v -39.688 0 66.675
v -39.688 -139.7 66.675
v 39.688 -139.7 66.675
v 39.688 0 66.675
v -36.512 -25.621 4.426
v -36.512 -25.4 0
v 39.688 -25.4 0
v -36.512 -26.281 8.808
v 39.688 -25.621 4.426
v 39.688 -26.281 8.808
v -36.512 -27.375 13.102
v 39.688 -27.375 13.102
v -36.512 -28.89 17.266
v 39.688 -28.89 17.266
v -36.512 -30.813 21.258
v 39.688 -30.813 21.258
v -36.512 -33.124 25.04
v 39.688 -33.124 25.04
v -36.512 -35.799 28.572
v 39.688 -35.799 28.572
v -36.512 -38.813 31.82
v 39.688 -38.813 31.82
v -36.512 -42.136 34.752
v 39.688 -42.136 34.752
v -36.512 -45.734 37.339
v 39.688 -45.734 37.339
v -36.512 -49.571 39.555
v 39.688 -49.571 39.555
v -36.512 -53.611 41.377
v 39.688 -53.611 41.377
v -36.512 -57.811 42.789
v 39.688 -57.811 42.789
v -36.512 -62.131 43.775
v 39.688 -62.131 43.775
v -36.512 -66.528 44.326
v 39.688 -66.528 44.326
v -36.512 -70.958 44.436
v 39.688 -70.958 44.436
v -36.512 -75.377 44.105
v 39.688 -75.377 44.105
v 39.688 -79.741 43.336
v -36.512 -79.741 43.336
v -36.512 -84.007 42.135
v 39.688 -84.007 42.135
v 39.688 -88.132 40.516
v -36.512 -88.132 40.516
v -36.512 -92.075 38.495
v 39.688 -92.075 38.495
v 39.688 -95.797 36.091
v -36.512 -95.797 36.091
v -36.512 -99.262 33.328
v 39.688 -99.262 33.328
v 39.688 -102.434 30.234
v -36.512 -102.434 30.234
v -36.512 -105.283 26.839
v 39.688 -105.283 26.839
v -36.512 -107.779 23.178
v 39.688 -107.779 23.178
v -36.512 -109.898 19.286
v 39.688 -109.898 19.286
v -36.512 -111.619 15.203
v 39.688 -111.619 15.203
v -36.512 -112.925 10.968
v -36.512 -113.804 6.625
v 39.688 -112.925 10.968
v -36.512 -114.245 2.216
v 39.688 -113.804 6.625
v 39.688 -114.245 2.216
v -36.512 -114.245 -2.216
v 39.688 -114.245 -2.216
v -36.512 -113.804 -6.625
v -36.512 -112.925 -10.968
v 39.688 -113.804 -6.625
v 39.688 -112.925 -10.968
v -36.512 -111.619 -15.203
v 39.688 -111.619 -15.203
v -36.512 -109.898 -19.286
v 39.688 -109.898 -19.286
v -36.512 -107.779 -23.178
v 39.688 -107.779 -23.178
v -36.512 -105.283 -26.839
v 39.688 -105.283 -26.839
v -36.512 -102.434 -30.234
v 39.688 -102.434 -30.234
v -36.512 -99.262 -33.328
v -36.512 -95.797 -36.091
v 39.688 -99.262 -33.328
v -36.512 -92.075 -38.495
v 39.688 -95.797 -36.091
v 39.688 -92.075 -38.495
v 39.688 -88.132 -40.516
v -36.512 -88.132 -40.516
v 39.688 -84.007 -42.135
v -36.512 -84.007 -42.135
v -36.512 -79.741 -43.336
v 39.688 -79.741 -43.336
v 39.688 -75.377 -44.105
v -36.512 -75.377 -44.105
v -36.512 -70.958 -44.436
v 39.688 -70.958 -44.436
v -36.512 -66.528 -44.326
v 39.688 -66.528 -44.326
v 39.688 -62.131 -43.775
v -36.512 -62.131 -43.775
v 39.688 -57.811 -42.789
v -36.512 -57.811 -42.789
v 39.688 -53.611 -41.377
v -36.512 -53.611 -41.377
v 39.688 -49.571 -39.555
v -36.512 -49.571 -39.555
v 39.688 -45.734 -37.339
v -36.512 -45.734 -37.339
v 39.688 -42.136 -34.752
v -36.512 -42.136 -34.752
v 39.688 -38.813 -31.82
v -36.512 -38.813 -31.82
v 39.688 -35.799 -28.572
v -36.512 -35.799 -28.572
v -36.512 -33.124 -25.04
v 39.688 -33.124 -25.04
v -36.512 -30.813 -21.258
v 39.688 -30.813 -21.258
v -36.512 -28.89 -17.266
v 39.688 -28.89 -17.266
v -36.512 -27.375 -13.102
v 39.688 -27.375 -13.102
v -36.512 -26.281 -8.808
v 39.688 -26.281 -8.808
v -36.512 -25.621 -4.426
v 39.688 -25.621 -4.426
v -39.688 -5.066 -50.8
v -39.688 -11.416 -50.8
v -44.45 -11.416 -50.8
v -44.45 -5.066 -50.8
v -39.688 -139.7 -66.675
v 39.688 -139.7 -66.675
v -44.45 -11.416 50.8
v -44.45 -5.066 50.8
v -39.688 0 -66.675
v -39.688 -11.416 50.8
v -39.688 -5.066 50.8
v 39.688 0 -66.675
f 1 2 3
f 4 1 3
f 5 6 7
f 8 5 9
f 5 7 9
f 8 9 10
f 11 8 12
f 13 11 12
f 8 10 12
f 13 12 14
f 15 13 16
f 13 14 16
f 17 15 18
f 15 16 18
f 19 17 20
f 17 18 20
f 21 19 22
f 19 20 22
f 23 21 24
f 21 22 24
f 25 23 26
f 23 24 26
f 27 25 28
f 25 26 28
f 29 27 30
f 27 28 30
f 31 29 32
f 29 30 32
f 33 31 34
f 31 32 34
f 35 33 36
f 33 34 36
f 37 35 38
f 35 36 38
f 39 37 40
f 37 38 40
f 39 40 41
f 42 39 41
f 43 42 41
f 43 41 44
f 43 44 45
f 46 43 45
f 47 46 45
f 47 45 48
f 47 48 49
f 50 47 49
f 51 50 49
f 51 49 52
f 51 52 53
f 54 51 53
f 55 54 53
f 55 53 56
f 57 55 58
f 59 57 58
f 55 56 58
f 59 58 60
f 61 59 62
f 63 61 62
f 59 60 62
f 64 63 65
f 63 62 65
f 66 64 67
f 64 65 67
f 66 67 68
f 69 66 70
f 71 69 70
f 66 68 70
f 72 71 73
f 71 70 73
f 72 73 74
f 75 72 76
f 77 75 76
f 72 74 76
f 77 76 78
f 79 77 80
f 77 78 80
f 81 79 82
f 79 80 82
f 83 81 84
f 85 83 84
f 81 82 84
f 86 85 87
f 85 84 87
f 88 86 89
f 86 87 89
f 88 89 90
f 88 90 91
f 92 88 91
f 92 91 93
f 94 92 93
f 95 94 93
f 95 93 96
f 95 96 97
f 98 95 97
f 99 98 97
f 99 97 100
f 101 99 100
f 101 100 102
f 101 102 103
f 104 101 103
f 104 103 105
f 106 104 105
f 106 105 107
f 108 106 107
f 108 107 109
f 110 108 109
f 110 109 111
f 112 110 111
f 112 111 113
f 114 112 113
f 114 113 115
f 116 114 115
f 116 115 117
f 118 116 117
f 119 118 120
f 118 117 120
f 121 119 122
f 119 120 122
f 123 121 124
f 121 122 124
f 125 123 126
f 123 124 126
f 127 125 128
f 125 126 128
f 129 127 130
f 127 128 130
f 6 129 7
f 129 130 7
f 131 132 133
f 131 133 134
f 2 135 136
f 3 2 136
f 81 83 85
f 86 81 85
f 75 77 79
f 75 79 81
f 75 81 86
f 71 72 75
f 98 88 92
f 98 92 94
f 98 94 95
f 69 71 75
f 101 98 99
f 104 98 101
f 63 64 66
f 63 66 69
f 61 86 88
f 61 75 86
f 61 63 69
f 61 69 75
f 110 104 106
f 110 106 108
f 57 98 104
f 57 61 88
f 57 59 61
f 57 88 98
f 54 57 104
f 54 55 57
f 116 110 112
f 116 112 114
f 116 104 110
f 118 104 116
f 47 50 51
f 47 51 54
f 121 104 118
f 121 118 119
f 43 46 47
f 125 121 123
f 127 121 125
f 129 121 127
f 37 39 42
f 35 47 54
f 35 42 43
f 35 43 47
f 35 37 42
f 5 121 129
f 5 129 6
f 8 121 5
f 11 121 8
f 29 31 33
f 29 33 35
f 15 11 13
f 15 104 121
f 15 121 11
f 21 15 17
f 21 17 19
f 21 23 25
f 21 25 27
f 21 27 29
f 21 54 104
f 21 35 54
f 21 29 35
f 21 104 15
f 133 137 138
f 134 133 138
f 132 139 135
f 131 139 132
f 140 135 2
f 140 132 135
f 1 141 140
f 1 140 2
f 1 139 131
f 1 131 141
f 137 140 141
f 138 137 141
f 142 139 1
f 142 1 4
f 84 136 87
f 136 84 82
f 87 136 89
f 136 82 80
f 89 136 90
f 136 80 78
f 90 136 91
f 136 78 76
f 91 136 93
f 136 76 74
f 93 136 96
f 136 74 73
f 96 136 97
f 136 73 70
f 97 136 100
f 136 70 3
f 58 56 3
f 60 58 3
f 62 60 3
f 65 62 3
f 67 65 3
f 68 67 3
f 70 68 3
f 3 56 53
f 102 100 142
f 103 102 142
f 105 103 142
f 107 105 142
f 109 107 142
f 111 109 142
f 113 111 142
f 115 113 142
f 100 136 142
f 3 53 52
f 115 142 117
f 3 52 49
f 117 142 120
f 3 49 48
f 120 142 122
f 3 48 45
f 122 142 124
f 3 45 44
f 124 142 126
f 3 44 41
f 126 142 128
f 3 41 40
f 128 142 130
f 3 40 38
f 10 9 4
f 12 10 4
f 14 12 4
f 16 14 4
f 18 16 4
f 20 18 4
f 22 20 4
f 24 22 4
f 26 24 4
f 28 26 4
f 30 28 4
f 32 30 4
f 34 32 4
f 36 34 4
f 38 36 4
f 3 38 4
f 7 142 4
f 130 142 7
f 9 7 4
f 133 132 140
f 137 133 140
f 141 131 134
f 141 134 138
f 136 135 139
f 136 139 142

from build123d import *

# Parameters (mm, degrees)
F0_W     = 79.375
F0_H     = 133.35
F1_DEPTH = 139.7
F2_R     = 44.45
F3_DEPTH = 76.2
F4_W     = 6.35
F4_H     = 101.6
F5_DEPTH = 44.45


# Not quite as in the source:
# - a feature names something its author has since deleted; it is built from what else it names


with BuildPart() as f1:
    # F0 (on Front) → F1 (new body)
    with BuildSketch(Plane.XZ):
        Rectangle(F0_W, F0_H)
    extrude(amount=F1_DEPTH)

    # F2 (on face) → F3 (cut)
    with BuildSketch(Plane.YZ.offset(39.6875)):
        with Locations((-69.85, 0)):
            Circle(F2_R)
    extrude(amount=-F3_DEPTH, mode=Mode.SUBTRACT)

    # F4 (on Right) → F5 (join)
    with BuildSketch(Plane.YZ):
        with Locations((-8.2414448261, 0)):
            Rectangle(F4_W, F4_H)
    extrude(amount=-F5_DEPTH)


solid = f1.part
